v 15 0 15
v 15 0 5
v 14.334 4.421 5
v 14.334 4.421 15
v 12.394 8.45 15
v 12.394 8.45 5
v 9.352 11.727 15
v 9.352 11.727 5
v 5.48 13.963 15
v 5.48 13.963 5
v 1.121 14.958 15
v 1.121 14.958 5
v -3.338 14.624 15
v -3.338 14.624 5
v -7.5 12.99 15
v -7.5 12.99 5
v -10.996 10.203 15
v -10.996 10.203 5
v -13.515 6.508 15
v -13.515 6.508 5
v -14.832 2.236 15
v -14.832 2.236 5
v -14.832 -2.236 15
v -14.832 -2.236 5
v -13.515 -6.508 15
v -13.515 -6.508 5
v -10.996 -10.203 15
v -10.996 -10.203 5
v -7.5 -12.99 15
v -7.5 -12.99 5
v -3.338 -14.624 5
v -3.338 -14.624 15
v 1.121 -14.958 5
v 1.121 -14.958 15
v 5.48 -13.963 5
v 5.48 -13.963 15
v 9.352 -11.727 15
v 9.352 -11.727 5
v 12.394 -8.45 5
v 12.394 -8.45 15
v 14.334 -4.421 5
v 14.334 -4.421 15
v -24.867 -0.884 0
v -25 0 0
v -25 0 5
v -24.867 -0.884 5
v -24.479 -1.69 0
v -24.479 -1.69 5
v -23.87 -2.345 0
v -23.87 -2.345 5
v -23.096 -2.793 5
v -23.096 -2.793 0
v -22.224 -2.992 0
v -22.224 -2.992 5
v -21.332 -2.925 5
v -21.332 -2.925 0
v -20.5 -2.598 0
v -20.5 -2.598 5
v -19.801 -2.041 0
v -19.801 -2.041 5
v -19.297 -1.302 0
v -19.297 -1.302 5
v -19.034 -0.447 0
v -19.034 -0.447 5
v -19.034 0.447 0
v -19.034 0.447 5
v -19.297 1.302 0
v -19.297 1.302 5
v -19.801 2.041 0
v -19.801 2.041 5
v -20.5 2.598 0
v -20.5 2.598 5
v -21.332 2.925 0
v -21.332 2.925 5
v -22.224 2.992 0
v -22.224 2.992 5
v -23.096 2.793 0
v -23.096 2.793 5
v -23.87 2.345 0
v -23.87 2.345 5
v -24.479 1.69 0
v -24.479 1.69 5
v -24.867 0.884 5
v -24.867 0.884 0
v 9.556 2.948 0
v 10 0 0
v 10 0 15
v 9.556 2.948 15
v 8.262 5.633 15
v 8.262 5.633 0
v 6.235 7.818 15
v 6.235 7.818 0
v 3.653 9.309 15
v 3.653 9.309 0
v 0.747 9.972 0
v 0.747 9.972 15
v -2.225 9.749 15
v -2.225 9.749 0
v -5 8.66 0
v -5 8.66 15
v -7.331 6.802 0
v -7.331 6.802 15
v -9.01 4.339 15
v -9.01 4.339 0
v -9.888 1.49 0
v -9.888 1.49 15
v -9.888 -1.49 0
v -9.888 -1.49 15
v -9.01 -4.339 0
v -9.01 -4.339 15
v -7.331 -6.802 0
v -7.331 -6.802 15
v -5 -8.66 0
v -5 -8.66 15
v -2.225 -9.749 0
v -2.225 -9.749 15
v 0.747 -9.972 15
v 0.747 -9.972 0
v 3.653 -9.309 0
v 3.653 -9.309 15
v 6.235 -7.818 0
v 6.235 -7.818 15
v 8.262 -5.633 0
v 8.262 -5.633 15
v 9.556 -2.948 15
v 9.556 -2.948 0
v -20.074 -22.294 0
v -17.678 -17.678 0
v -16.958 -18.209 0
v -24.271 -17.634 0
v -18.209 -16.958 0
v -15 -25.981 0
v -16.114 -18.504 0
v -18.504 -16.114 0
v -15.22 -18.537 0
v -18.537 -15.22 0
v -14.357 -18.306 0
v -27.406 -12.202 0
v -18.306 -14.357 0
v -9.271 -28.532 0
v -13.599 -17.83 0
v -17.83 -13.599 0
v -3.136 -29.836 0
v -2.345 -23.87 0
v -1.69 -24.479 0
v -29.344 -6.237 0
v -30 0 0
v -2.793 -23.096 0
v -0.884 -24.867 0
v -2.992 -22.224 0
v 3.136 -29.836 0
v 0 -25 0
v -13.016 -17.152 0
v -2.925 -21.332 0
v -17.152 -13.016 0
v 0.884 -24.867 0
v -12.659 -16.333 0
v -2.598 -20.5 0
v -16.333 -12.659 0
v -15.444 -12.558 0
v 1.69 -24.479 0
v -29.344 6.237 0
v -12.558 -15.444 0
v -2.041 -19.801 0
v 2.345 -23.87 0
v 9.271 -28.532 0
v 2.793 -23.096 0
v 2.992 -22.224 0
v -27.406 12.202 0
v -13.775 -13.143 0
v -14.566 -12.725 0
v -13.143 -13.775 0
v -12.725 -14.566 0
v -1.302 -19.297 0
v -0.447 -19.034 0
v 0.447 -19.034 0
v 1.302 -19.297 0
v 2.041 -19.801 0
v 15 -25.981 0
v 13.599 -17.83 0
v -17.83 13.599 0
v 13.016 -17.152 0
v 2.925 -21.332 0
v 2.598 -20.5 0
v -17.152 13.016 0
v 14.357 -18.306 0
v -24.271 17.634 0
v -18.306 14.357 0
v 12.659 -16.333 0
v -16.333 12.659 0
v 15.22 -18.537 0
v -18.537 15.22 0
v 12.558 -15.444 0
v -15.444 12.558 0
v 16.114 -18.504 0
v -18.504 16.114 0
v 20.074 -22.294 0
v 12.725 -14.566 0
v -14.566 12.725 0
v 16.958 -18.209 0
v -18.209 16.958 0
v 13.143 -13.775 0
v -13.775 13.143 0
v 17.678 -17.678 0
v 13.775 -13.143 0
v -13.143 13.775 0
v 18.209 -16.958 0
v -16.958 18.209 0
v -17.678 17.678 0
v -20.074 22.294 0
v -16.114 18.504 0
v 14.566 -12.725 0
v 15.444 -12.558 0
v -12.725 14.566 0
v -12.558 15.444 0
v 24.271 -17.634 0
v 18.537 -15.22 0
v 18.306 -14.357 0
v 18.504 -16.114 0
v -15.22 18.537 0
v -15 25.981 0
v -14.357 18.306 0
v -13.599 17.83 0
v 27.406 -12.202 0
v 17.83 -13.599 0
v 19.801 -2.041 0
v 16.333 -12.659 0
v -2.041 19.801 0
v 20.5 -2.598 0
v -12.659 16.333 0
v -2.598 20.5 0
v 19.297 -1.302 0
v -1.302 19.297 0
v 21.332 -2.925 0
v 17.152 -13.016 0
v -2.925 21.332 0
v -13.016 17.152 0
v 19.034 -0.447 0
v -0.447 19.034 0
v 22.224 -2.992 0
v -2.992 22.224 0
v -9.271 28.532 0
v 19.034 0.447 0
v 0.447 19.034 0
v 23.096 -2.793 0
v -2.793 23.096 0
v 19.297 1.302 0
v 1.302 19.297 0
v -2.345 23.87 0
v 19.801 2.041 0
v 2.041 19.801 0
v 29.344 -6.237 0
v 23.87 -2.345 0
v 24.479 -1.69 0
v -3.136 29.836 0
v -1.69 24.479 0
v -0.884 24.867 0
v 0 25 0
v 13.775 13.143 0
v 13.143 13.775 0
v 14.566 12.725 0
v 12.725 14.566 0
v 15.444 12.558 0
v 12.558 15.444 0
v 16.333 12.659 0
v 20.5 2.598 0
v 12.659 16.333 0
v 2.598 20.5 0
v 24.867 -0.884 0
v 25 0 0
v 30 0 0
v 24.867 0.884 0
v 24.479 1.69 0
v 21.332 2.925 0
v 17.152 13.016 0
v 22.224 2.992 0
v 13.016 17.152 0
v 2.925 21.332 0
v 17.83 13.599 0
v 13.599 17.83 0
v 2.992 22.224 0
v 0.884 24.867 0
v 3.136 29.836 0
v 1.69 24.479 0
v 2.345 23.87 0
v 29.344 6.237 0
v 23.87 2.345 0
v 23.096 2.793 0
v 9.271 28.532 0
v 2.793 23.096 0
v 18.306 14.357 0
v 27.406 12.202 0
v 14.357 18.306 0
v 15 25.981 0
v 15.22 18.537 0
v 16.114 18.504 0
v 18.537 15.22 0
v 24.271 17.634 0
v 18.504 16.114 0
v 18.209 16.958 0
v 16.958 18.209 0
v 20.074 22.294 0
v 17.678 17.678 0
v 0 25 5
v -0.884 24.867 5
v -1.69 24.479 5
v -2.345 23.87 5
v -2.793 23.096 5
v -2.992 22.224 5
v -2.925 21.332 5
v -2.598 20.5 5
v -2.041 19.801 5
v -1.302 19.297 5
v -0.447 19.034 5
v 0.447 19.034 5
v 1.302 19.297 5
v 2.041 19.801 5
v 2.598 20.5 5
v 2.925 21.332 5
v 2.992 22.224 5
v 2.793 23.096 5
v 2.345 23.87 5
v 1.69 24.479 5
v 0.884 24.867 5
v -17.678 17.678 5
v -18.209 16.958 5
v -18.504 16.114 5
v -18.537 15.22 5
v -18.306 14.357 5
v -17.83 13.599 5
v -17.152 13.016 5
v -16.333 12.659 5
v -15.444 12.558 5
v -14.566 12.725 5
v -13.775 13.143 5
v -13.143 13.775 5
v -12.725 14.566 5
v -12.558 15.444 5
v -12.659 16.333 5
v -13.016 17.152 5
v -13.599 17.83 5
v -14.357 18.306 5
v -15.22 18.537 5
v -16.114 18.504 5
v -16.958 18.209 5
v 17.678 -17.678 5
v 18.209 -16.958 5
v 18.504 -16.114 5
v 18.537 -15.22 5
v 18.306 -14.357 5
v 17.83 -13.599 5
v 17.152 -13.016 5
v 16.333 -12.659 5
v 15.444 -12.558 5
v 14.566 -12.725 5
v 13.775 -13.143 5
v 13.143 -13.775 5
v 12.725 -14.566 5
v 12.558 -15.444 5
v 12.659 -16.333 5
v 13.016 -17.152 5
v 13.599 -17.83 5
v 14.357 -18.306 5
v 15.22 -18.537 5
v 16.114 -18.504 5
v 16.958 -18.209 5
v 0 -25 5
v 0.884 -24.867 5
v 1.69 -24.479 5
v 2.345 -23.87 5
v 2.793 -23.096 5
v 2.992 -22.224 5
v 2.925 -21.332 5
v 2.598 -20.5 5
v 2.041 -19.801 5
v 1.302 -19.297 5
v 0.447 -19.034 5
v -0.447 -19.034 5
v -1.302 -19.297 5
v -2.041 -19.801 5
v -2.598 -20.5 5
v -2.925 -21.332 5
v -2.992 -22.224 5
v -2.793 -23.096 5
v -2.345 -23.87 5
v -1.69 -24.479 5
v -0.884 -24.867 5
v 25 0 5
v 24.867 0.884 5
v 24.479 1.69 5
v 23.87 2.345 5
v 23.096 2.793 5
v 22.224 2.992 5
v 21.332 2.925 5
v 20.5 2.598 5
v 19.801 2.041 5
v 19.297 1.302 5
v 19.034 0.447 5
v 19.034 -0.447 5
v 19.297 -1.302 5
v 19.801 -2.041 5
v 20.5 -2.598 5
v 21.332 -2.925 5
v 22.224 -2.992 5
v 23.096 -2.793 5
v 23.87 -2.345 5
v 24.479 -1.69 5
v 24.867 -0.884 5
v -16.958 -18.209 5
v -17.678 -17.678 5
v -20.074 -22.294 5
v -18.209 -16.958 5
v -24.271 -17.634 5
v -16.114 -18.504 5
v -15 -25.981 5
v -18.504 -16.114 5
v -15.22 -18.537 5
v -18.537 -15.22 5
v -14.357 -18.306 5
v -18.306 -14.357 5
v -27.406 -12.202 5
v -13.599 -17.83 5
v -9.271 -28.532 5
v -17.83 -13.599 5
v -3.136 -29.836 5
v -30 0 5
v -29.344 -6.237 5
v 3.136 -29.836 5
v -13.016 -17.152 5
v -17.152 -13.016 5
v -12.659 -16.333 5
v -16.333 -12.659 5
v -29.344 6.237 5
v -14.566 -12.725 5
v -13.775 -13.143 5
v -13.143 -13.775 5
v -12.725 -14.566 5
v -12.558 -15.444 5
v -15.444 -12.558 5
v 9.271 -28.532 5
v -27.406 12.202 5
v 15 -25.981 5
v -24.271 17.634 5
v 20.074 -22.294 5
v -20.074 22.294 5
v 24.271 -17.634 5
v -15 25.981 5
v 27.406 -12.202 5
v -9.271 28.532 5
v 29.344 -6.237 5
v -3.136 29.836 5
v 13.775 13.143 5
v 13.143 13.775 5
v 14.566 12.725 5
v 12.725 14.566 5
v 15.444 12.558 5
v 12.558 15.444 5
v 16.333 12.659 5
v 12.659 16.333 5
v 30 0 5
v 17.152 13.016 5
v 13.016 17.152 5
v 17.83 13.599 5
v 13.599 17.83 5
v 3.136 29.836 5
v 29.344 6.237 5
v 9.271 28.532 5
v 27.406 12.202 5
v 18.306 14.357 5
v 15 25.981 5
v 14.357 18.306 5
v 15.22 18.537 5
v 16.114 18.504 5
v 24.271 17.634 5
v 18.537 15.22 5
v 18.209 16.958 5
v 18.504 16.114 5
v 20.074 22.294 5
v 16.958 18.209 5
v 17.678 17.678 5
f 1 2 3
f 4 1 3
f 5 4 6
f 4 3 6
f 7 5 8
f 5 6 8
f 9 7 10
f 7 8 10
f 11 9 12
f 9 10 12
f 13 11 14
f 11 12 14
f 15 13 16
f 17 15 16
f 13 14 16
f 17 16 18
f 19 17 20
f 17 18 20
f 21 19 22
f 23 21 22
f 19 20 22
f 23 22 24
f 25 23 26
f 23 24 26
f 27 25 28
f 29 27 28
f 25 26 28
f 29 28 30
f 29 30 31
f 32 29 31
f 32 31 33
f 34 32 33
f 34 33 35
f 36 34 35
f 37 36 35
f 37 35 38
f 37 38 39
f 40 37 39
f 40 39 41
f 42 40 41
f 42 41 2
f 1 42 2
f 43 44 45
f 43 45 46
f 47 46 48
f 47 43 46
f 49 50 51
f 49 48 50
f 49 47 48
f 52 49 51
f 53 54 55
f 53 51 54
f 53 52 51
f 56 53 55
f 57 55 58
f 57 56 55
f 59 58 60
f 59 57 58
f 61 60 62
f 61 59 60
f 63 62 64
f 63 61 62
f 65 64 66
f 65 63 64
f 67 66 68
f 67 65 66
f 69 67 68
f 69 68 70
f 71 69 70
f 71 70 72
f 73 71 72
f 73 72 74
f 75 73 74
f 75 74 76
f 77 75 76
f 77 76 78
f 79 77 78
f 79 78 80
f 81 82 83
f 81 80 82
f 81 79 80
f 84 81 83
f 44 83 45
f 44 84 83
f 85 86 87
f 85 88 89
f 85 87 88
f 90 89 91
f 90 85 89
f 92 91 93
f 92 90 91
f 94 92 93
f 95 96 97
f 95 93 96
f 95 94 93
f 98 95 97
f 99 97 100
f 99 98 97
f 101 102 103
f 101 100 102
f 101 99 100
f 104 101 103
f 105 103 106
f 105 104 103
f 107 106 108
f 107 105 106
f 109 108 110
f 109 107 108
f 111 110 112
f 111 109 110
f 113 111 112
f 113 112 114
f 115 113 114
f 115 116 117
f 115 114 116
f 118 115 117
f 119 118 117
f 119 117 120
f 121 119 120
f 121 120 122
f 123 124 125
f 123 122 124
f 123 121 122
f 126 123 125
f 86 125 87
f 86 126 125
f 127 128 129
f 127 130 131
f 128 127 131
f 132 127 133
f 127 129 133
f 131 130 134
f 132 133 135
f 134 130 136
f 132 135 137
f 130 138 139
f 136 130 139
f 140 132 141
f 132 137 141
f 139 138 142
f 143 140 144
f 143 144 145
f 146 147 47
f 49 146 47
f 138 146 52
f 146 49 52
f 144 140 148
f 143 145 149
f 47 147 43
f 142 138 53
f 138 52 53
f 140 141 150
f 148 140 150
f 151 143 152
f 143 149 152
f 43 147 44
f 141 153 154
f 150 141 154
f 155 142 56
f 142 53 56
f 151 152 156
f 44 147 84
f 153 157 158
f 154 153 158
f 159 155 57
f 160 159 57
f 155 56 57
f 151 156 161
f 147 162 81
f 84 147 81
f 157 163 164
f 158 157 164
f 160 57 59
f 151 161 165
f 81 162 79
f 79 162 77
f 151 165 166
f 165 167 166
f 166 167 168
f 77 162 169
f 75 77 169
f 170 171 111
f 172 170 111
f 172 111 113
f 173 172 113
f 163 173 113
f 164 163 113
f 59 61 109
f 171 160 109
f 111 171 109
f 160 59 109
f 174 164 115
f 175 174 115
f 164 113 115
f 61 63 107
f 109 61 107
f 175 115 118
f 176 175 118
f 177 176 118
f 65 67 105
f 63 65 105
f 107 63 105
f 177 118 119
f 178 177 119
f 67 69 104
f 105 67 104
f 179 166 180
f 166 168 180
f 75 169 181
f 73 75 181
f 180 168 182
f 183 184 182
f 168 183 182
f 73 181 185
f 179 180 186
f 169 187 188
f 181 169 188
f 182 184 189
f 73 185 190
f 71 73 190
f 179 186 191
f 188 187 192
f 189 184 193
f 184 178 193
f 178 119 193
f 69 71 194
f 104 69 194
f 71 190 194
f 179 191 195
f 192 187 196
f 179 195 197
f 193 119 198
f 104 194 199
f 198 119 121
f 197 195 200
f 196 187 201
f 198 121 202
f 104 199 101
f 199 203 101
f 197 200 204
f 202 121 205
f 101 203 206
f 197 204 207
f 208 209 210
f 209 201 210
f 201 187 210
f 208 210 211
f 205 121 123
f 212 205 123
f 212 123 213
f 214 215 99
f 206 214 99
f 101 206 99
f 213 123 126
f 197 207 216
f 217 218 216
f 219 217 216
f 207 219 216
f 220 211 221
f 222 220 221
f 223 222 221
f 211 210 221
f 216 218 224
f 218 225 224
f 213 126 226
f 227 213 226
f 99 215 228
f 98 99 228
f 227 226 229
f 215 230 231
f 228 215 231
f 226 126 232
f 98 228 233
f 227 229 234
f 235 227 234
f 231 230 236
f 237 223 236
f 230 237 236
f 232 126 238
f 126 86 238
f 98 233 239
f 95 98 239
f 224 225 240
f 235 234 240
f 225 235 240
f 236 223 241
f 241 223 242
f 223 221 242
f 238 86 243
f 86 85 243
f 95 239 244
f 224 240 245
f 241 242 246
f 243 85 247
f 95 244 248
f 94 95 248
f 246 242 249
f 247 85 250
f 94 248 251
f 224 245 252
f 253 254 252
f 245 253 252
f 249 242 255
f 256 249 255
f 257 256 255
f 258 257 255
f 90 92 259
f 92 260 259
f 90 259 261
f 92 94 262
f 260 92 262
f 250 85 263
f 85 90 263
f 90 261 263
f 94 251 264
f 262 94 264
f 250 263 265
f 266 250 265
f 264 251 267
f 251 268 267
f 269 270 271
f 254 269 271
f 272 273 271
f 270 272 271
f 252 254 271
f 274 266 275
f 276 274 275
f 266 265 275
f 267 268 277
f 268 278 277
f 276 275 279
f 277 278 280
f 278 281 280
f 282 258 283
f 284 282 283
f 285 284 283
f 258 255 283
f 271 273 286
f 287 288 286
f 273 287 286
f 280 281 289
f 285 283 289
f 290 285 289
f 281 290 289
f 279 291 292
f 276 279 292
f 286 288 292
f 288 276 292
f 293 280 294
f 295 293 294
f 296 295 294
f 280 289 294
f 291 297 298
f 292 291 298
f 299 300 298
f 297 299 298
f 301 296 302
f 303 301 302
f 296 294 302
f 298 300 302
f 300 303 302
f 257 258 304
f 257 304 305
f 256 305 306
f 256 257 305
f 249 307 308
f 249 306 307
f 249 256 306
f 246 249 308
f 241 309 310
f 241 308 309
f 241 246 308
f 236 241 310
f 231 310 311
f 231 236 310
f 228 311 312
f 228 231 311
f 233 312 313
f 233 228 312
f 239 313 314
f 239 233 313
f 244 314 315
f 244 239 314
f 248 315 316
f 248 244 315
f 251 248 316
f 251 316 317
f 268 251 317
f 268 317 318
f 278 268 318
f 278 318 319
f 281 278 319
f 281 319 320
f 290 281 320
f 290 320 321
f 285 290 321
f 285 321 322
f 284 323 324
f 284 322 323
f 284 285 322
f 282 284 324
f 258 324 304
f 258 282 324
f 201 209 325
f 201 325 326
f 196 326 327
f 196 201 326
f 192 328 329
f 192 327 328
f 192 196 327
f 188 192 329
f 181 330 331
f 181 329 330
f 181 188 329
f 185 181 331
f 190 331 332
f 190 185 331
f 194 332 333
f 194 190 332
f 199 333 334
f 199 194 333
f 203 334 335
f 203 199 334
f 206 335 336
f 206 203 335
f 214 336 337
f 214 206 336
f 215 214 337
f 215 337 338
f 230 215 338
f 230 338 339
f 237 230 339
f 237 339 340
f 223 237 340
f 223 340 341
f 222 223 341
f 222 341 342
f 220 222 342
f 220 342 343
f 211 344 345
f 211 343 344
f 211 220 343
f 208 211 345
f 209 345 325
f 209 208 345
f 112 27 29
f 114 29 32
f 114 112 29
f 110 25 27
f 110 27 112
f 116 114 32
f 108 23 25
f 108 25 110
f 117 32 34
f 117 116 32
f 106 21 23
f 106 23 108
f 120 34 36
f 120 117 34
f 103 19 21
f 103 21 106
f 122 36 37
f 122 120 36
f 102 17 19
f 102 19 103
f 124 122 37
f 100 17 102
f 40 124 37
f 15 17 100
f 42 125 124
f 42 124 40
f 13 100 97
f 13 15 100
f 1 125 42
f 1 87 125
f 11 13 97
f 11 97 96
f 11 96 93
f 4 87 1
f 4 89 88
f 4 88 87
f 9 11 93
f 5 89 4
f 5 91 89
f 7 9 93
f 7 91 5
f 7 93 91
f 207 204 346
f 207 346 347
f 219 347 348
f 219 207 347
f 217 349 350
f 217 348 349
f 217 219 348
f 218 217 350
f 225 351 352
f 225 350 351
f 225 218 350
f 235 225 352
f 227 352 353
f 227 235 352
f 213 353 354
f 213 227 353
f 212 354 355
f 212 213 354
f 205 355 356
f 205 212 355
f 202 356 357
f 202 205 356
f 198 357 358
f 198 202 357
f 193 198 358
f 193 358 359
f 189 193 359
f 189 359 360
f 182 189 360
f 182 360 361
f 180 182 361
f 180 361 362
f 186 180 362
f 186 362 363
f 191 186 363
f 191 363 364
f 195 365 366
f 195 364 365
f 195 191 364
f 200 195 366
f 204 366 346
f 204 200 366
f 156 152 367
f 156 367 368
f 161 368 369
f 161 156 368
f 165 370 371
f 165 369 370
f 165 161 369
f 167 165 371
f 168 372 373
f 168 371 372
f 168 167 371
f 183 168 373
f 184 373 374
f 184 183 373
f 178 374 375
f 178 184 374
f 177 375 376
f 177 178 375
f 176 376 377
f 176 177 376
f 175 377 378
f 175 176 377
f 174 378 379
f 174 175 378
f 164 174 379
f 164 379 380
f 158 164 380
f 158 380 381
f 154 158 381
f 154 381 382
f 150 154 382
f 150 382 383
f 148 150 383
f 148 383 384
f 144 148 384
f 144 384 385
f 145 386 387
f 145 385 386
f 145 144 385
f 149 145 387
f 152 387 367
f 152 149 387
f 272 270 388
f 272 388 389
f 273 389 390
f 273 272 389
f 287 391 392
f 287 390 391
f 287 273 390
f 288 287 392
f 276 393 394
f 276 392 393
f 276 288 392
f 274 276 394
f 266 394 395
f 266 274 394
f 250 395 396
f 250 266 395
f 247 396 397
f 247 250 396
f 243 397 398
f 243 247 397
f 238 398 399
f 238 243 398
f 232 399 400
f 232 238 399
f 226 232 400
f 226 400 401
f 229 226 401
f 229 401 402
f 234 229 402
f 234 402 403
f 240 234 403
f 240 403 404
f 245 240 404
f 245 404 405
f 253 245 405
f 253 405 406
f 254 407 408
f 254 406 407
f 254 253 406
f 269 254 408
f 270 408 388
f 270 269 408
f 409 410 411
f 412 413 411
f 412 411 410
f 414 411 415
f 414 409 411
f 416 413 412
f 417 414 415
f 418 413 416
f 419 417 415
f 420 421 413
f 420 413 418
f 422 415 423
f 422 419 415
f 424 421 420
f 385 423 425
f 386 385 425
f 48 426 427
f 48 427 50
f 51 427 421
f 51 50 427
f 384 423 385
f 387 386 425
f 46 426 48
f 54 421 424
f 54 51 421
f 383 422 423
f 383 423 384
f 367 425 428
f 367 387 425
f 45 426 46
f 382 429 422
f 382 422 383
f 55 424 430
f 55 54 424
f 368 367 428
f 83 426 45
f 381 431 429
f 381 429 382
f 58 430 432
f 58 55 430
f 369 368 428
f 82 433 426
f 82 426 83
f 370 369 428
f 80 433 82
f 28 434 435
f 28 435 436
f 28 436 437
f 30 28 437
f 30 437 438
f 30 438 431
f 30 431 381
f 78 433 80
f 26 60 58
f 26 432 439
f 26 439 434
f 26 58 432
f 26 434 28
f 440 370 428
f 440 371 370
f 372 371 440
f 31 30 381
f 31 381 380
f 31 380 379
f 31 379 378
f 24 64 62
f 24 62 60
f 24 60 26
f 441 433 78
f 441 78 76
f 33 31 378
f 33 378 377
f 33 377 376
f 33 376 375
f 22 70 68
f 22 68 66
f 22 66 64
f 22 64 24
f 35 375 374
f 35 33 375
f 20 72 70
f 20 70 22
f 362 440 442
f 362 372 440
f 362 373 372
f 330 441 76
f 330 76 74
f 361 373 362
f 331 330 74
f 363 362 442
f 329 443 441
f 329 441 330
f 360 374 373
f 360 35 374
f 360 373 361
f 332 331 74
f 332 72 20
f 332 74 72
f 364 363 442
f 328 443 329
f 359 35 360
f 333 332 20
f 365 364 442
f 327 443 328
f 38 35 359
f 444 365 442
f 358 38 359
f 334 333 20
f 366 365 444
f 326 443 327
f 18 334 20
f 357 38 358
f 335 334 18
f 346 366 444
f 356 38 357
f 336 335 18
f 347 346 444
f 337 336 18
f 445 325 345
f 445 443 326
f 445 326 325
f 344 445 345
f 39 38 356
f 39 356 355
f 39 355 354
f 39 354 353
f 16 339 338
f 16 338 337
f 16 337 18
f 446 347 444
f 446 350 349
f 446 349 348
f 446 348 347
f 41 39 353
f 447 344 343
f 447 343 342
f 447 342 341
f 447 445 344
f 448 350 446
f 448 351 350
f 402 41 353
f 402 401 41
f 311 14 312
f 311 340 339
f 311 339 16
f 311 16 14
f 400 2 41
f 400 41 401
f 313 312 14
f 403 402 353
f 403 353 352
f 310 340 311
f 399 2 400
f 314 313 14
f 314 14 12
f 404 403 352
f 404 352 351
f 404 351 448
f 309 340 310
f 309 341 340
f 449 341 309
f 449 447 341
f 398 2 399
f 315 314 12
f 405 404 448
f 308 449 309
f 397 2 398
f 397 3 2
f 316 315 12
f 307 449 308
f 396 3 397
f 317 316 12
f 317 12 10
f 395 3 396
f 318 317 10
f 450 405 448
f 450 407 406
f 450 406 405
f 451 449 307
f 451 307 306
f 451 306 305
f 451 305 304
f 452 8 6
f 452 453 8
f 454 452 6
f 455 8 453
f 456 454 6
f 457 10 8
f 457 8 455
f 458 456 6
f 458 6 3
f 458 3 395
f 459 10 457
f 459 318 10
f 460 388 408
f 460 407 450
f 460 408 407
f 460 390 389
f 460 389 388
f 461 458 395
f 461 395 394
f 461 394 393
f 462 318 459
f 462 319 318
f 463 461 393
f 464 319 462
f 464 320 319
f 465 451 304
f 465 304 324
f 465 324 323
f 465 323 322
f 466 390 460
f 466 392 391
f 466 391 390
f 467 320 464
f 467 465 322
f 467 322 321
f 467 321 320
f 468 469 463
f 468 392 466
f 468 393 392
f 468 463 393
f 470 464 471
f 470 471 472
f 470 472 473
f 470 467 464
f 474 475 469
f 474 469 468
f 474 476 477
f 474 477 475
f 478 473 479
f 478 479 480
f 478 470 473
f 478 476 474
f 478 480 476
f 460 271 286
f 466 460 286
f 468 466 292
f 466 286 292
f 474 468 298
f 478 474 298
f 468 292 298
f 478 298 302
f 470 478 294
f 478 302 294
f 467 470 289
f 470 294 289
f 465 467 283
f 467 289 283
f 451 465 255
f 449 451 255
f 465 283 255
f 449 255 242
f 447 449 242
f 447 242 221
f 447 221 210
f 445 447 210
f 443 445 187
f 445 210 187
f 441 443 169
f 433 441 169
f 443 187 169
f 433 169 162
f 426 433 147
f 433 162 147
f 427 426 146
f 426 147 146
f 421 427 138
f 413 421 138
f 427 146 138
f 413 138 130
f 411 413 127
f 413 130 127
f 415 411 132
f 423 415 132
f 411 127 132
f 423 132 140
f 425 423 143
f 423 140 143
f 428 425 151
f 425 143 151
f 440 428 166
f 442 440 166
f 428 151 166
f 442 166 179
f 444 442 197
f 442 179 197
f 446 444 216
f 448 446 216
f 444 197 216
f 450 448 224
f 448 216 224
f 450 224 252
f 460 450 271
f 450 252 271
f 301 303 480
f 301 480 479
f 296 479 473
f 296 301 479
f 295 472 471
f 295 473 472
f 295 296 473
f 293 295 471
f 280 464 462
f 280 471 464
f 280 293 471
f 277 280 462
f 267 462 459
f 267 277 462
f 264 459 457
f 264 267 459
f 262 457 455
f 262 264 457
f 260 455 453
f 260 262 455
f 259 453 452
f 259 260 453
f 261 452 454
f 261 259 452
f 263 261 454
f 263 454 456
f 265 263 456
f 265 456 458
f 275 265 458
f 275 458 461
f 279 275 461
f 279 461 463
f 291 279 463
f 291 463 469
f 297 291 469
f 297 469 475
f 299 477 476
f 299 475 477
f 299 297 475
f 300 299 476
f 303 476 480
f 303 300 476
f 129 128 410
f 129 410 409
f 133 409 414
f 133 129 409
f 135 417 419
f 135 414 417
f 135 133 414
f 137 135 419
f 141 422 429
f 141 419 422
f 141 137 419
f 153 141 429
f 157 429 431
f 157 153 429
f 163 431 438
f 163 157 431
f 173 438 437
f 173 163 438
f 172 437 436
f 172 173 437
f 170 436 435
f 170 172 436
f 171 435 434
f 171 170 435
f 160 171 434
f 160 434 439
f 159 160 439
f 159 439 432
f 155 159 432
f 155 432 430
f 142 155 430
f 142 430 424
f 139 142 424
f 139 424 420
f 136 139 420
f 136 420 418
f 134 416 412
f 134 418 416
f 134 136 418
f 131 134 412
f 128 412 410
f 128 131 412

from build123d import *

# Parameters (mm, degrees)
CYLINDER003_R     = 3
CYLINDER003_DEPTH = 10
ARRAY001_COUNT    = 8
CYLINDER002_R     = 10
CYLINDER002_DEPTH = 30
CYLINDER001_R     = 15
CYLINDER001_DEPTH = 15
CYLINDER_R        = 30
CYLINDER_DEPTH    = 5


with BuildPart() as array001:
    # Cylinder003 → Cylinder003 (new body)
    with BuildSketch(Plane(origin=(22, 0, -3), x_dir=(1, 0, 0), z_dir=(0, 0, 1))):
        Circle(CYLINDER003_R)
    extrude(amount=CYLINDER003_DEPTH)

    # Array001: Array001 ×8 about axis
    array001_axis = Axis((0, 0, 0), (0, 0, 1))


with BuildPart() as array001_1:
    add(array001.part)
    for i in range(1, ARRAY001_COUNT):
        add(array001.part.rotate(array001_axis, i * 360 / ARRAY001_COUNT))


with BuildPart() as cilindre002:
    # Cylinder002 → Cylinder002 (new body)
    with BuildSketch(Plane.XY.offset(-4)):
        Circle(CYLINDER002_R)
    extrude(amount=CYLINDER002_DEPTH)


with BuildPart() as cilindre001:
    # Cylinder001 → Cylinder001 (new body)
    with BuildSketch(Plane.XY):
        Circle(CYLINDER001_R)
    extrude(amount=CYLINDER001_DEPTH)


with BuildPart() as cut001:
    # Cylinder → Cylinder (new body)
    with BuildSketch(Plane.XY):
        Circle(CYLINDER_R)
    extrude(amount=CYLINDER_DEPTH)

    # Fusion: union Cilindre001
    add(cilindre001.part)

    # Cut: cut Cilindre002
    add(cilindre002.part, mode=Mode.SUBTRACT)

    # Cut001: cut Array001
    add(array001_1.part, mode=Mode.SUBTRACT)


solid = cut001.part
